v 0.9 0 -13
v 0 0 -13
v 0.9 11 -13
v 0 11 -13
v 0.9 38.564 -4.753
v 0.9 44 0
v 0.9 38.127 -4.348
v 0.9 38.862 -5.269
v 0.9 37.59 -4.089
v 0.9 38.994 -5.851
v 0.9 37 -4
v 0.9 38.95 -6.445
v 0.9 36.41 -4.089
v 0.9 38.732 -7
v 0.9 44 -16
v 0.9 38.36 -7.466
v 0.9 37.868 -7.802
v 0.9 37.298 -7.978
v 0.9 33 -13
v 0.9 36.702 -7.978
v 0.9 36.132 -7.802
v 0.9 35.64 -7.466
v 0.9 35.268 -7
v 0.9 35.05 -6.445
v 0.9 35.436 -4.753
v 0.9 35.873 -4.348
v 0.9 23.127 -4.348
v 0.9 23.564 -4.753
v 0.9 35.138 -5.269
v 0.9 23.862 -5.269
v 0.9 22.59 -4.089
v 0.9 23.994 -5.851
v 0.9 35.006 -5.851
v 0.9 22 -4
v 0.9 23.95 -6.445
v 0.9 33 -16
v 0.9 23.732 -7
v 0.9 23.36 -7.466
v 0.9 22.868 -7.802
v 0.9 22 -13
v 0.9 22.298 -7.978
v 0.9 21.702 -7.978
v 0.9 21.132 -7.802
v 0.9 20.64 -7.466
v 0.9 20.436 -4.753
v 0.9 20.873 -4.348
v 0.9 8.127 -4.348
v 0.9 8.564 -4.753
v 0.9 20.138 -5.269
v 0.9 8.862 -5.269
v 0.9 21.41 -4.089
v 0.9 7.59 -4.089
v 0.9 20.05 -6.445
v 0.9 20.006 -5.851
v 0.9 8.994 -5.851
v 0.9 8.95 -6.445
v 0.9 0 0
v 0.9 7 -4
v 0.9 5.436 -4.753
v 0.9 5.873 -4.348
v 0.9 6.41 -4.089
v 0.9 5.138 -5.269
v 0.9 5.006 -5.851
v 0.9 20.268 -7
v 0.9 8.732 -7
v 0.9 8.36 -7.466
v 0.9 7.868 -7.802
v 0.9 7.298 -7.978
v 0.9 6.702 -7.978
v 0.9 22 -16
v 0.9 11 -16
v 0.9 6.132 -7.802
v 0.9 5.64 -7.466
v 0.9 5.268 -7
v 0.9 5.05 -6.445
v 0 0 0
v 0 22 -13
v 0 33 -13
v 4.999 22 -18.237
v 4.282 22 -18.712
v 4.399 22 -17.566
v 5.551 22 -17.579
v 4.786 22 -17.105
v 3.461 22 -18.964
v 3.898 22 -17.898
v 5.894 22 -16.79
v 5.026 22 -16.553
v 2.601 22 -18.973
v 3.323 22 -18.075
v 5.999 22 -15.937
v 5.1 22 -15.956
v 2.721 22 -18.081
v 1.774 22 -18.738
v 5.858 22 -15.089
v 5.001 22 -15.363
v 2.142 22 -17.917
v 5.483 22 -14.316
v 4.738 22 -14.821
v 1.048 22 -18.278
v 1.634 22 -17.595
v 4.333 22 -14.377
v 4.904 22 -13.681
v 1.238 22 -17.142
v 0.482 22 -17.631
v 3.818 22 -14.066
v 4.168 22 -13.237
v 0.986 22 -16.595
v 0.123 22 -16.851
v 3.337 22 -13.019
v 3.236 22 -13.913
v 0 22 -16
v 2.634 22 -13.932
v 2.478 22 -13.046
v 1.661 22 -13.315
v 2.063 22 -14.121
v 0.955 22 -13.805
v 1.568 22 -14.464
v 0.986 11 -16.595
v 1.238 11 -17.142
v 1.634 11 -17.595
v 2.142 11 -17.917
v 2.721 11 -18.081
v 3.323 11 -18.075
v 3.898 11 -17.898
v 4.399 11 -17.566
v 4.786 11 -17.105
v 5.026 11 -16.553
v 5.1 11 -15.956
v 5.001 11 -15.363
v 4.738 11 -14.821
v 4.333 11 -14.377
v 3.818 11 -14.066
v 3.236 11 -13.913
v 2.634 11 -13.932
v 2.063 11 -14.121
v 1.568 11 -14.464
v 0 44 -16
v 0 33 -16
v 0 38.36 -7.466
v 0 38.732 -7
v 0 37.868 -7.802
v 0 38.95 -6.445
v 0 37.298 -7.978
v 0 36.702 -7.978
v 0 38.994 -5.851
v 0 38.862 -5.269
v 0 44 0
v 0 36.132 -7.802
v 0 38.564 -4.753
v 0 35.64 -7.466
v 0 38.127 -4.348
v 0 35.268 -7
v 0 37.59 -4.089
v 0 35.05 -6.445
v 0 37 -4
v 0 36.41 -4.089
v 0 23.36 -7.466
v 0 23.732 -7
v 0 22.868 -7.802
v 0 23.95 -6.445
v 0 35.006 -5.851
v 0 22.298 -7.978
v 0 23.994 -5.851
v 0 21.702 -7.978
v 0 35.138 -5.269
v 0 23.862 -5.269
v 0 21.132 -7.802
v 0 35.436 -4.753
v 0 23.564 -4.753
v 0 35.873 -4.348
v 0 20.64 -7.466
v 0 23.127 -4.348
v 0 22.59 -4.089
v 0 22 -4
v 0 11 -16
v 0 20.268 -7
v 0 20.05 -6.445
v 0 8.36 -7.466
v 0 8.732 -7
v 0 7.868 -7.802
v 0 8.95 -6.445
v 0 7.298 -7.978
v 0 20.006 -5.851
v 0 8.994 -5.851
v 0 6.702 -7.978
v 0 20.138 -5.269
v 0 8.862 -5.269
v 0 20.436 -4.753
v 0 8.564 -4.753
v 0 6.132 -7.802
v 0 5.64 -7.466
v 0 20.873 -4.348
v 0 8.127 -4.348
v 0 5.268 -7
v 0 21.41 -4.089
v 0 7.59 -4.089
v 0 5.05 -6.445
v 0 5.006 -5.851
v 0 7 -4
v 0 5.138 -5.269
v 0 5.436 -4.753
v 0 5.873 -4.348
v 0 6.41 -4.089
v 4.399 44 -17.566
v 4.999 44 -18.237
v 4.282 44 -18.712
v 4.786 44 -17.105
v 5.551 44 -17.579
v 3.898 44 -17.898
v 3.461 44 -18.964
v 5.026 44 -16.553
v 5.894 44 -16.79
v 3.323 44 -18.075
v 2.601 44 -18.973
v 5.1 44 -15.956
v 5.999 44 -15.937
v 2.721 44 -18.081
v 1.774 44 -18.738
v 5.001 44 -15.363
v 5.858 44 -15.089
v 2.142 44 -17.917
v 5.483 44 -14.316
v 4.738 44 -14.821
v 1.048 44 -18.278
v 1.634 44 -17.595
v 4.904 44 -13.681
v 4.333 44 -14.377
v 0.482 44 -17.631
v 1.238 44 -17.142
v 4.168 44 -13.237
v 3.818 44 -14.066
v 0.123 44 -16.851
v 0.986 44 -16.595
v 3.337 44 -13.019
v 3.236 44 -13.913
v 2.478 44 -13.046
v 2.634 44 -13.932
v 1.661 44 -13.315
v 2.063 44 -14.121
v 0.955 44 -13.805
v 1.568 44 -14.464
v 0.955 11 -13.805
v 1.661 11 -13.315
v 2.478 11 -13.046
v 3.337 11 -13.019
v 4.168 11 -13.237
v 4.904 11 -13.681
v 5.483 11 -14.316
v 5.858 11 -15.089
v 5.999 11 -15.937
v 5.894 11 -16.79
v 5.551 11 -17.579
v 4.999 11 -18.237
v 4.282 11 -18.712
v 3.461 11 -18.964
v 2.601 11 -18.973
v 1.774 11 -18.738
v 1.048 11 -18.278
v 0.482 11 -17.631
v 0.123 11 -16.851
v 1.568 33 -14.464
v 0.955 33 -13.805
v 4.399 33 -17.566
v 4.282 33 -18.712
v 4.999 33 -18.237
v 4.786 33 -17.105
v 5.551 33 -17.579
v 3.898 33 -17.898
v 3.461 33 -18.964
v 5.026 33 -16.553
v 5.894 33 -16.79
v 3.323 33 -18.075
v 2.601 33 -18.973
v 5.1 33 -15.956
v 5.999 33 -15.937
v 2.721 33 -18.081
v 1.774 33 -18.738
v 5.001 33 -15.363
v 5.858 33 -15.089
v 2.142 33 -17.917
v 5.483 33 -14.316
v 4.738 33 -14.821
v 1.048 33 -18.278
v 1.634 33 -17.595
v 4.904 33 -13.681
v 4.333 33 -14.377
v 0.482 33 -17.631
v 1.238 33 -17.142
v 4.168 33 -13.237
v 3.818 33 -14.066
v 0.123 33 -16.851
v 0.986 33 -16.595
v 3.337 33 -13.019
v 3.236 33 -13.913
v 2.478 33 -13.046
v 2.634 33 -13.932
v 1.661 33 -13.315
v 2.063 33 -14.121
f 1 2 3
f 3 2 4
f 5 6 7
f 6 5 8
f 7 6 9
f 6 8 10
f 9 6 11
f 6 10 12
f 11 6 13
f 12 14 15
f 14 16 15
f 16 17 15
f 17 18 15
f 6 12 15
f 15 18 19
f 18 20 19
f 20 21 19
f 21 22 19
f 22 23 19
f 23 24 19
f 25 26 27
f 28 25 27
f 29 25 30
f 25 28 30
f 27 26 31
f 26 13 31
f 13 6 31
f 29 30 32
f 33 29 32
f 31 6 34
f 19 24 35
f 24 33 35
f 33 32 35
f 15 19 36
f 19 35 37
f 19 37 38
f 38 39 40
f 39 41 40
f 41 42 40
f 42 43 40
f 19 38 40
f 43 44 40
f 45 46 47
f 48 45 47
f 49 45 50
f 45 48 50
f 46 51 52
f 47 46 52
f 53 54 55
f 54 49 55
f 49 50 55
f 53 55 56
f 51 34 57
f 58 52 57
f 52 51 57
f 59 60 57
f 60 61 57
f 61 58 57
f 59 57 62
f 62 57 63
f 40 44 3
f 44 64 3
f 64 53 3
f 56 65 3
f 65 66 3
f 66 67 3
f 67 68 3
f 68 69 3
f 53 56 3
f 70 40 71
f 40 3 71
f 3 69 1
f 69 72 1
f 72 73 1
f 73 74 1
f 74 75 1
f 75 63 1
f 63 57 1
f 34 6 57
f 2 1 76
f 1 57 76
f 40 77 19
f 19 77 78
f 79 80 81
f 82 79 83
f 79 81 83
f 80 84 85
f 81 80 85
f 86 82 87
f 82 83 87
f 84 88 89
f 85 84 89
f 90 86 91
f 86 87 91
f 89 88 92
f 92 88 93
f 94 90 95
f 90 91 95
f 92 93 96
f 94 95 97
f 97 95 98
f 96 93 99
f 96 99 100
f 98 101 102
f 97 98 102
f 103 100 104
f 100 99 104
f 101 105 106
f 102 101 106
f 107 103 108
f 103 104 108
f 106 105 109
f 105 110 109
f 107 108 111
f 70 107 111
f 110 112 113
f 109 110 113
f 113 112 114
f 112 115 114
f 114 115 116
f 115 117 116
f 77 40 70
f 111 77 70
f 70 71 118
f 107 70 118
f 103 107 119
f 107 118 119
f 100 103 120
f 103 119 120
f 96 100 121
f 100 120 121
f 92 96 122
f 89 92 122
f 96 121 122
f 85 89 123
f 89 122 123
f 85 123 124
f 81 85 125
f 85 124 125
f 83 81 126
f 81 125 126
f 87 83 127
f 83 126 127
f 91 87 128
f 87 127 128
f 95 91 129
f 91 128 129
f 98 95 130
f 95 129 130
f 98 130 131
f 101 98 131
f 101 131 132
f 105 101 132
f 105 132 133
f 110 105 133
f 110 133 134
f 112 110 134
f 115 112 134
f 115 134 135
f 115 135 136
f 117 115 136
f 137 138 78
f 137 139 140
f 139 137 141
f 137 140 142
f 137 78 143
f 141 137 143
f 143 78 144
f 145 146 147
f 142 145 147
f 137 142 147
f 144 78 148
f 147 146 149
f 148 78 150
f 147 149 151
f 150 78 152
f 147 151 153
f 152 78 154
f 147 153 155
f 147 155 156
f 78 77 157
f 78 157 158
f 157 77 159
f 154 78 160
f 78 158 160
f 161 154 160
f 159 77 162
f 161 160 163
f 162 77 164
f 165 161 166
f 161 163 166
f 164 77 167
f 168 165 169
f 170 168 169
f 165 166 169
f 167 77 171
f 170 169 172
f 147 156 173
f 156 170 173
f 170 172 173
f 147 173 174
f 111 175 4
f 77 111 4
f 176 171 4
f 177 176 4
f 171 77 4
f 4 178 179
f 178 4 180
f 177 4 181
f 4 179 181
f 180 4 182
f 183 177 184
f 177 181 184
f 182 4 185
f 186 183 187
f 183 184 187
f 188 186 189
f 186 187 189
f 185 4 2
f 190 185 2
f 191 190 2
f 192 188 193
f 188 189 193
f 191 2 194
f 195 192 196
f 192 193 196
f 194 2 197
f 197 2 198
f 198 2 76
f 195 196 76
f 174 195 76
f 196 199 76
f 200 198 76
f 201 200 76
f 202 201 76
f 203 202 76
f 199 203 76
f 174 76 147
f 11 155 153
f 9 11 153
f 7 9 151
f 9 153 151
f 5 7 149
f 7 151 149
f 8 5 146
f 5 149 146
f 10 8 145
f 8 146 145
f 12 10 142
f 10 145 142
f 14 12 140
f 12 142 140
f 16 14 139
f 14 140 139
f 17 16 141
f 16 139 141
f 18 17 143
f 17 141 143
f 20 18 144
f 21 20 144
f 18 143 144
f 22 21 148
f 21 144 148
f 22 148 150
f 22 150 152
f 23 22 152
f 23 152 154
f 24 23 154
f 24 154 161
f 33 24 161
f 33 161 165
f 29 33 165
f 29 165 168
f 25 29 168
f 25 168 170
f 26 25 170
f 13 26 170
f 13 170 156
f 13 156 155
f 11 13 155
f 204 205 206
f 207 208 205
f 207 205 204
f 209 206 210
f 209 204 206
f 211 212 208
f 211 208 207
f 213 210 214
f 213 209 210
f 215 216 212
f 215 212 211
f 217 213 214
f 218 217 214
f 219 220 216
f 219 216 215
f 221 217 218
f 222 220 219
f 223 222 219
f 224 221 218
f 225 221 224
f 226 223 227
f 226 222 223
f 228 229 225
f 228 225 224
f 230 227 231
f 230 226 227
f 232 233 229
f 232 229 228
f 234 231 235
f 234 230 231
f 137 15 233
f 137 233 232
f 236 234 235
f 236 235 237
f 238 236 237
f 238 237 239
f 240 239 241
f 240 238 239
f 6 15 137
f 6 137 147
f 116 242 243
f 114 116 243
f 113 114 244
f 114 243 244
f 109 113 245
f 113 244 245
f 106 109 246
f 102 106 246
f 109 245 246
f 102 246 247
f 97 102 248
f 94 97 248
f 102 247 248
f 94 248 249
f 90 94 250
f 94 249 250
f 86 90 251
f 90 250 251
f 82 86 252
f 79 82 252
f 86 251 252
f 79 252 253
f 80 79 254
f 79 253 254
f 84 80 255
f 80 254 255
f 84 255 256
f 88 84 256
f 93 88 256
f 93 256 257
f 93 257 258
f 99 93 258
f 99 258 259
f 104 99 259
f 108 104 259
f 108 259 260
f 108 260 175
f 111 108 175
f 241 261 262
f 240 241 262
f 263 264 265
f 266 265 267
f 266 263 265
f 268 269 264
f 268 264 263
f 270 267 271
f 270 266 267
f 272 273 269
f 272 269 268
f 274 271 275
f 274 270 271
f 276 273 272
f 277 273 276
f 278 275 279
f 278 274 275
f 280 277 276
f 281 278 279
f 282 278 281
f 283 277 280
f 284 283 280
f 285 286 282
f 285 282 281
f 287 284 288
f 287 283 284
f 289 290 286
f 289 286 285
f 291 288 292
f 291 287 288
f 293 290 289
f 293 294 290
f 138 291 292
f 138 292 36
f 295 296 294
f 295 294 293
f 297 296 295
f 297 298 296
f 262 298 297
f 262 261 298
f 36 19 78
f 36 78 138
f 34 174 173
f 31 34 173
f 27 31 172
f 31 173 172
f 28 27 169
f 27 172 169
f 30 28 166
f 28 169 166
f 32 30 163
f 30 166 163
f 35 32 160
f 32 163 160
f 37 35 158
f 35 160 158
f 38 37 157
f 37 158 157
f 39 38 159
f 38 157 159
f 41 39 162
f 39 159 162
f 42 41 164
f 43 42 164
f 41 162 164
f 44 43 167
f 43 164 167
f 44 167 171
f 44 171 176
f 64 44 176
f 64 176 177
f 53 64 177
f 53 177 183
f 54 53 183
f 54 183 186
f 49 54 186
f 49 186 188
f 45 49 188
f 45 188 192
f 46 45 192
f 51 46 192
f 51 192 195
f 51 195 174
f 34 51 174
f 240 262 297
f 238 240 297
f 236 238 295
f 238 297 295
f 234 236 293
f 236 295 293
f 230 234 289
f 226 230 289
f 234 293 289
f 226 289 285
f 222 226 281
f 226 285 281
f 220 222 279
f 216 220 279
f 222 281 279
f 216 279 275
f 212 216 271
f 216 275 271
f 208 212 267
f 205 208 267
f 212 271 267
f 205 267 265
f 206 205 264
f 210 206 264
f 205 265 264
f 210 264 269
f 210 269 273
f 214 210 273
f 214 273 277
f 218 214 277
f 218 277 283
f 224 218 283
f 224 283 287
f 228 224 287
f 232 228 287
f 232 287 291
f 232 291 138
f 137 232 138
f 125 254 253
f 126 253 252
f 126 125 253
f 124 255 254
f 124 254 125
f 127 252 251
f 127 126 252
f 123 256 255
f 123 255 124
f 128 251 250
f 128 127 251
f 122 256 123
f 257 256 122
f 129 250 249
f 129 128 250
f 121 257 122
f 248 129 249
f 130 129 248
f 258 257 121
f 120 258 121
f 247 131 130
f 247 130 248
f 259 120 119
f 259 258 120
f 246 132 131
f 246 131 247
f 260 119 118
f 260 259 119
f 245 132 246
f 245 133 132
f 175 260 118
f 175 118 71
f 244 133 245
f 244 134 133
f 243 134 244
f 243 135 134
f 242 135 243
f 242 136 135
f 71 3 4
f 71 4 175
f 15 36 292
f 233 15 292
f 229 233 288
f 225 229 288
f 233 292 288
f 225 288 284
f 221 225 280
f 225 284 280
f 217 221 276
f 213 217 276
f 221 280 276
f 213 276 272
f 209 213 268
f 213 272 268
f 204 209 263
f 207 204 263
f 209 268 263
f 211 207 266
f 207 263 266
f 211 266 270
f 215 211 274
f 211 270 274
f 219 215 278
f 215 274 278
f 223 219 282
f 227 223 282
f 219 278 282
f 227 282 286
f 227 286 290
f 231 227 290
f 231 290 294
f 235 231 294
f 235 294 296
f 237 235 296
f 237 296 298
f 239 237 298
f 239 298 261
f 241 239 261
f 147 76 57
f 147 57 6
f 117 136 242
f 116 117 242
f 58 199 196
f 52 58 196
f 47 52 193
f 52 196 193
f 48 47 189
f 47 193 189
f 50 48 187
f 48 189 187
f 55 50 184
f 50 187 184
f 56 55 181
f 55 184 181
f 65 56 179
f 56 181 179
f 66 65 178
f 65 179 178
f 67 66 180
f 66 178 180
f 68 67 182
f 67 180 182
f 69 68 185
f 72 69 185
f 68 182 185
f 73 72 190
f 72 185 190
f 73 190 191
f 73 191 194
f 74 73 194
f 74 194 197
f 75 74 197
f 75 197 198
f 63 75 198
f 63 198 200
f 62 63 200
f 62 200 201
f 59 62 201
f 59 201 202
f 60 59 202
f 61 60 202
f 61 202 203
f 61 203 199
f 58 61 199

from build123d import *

# Parameters (mm, degrees)
SKETCH1_W           = 13
SKETCH1_H           = 44
BOSS_EXTRUDE1_DEPTH = 0.9
BOSS_EXTRUDE2_DEPTH = 44
SKETCH3_R           = 2
SKETCH3_W           = 6
SKETCH3_H           = 11
CUT_EXTRUDE1_DEPTH  = 127


with BuildPart() as part:
    # Sketch1 → Boss-Extrude1 (new body)
    with BuildSketch(Plane(origin=(0, 0, 0), x_dir=(0, 0, -1), z_dir=(1, 0, 0))):
        with Locations((6.5, 22)):
            Rectangle(SKETCH1_W, SKETCH1_H)
    extrude(amount=BOSS_EXTRUDE1_DEPTH)

    # Sketch2 → Boss-Extrude2 (add)
    with BuildSketch(Plane.XZ):
        with BuildLine():
            Line((0, -16), (0, -13))
            Line((0, -13), (0.9, -13))
            Line((0.9, -13), (0.9, -16))
            ThreePointArc((0.9, -16), (4.925639318, -16.837802611), (1.568488776, -14.46351843))
            Line((1.568488776, -14.46351843), (0.954983966, -13.805026328))
            ThreePointArc((0.954983966, -13.805026328), (5.750913312, -17.196860873), (0, -16))
        make_face()
    extrude(amount=-BOSS_EXTRUDE2_DEPTH)

    # Sketch3 → Cut-Extrude1 (cut)
    with BuildSketch(Plane.ZY):
        with Locations((-6, 7)):
            Circle(SKETCH3_R)
        with Locations((-6, 22)):
            Circle(SKETCH3_R)
        with Locations((-6, 37)):
            Circle(SKETCH3_R)
        with Locations((-16, 5.5)):
            Rectangle(SKETCH3_W, SKETCH3_H)
        with Locations((-16, 27.5)):
            Rectangle(SKETCH3_W, SKETCH3_H)
    extrude(amount=-CUT_EXTRUDE1_DEPTH, mode=Mode.SUBTRACT)


solid = part.part
